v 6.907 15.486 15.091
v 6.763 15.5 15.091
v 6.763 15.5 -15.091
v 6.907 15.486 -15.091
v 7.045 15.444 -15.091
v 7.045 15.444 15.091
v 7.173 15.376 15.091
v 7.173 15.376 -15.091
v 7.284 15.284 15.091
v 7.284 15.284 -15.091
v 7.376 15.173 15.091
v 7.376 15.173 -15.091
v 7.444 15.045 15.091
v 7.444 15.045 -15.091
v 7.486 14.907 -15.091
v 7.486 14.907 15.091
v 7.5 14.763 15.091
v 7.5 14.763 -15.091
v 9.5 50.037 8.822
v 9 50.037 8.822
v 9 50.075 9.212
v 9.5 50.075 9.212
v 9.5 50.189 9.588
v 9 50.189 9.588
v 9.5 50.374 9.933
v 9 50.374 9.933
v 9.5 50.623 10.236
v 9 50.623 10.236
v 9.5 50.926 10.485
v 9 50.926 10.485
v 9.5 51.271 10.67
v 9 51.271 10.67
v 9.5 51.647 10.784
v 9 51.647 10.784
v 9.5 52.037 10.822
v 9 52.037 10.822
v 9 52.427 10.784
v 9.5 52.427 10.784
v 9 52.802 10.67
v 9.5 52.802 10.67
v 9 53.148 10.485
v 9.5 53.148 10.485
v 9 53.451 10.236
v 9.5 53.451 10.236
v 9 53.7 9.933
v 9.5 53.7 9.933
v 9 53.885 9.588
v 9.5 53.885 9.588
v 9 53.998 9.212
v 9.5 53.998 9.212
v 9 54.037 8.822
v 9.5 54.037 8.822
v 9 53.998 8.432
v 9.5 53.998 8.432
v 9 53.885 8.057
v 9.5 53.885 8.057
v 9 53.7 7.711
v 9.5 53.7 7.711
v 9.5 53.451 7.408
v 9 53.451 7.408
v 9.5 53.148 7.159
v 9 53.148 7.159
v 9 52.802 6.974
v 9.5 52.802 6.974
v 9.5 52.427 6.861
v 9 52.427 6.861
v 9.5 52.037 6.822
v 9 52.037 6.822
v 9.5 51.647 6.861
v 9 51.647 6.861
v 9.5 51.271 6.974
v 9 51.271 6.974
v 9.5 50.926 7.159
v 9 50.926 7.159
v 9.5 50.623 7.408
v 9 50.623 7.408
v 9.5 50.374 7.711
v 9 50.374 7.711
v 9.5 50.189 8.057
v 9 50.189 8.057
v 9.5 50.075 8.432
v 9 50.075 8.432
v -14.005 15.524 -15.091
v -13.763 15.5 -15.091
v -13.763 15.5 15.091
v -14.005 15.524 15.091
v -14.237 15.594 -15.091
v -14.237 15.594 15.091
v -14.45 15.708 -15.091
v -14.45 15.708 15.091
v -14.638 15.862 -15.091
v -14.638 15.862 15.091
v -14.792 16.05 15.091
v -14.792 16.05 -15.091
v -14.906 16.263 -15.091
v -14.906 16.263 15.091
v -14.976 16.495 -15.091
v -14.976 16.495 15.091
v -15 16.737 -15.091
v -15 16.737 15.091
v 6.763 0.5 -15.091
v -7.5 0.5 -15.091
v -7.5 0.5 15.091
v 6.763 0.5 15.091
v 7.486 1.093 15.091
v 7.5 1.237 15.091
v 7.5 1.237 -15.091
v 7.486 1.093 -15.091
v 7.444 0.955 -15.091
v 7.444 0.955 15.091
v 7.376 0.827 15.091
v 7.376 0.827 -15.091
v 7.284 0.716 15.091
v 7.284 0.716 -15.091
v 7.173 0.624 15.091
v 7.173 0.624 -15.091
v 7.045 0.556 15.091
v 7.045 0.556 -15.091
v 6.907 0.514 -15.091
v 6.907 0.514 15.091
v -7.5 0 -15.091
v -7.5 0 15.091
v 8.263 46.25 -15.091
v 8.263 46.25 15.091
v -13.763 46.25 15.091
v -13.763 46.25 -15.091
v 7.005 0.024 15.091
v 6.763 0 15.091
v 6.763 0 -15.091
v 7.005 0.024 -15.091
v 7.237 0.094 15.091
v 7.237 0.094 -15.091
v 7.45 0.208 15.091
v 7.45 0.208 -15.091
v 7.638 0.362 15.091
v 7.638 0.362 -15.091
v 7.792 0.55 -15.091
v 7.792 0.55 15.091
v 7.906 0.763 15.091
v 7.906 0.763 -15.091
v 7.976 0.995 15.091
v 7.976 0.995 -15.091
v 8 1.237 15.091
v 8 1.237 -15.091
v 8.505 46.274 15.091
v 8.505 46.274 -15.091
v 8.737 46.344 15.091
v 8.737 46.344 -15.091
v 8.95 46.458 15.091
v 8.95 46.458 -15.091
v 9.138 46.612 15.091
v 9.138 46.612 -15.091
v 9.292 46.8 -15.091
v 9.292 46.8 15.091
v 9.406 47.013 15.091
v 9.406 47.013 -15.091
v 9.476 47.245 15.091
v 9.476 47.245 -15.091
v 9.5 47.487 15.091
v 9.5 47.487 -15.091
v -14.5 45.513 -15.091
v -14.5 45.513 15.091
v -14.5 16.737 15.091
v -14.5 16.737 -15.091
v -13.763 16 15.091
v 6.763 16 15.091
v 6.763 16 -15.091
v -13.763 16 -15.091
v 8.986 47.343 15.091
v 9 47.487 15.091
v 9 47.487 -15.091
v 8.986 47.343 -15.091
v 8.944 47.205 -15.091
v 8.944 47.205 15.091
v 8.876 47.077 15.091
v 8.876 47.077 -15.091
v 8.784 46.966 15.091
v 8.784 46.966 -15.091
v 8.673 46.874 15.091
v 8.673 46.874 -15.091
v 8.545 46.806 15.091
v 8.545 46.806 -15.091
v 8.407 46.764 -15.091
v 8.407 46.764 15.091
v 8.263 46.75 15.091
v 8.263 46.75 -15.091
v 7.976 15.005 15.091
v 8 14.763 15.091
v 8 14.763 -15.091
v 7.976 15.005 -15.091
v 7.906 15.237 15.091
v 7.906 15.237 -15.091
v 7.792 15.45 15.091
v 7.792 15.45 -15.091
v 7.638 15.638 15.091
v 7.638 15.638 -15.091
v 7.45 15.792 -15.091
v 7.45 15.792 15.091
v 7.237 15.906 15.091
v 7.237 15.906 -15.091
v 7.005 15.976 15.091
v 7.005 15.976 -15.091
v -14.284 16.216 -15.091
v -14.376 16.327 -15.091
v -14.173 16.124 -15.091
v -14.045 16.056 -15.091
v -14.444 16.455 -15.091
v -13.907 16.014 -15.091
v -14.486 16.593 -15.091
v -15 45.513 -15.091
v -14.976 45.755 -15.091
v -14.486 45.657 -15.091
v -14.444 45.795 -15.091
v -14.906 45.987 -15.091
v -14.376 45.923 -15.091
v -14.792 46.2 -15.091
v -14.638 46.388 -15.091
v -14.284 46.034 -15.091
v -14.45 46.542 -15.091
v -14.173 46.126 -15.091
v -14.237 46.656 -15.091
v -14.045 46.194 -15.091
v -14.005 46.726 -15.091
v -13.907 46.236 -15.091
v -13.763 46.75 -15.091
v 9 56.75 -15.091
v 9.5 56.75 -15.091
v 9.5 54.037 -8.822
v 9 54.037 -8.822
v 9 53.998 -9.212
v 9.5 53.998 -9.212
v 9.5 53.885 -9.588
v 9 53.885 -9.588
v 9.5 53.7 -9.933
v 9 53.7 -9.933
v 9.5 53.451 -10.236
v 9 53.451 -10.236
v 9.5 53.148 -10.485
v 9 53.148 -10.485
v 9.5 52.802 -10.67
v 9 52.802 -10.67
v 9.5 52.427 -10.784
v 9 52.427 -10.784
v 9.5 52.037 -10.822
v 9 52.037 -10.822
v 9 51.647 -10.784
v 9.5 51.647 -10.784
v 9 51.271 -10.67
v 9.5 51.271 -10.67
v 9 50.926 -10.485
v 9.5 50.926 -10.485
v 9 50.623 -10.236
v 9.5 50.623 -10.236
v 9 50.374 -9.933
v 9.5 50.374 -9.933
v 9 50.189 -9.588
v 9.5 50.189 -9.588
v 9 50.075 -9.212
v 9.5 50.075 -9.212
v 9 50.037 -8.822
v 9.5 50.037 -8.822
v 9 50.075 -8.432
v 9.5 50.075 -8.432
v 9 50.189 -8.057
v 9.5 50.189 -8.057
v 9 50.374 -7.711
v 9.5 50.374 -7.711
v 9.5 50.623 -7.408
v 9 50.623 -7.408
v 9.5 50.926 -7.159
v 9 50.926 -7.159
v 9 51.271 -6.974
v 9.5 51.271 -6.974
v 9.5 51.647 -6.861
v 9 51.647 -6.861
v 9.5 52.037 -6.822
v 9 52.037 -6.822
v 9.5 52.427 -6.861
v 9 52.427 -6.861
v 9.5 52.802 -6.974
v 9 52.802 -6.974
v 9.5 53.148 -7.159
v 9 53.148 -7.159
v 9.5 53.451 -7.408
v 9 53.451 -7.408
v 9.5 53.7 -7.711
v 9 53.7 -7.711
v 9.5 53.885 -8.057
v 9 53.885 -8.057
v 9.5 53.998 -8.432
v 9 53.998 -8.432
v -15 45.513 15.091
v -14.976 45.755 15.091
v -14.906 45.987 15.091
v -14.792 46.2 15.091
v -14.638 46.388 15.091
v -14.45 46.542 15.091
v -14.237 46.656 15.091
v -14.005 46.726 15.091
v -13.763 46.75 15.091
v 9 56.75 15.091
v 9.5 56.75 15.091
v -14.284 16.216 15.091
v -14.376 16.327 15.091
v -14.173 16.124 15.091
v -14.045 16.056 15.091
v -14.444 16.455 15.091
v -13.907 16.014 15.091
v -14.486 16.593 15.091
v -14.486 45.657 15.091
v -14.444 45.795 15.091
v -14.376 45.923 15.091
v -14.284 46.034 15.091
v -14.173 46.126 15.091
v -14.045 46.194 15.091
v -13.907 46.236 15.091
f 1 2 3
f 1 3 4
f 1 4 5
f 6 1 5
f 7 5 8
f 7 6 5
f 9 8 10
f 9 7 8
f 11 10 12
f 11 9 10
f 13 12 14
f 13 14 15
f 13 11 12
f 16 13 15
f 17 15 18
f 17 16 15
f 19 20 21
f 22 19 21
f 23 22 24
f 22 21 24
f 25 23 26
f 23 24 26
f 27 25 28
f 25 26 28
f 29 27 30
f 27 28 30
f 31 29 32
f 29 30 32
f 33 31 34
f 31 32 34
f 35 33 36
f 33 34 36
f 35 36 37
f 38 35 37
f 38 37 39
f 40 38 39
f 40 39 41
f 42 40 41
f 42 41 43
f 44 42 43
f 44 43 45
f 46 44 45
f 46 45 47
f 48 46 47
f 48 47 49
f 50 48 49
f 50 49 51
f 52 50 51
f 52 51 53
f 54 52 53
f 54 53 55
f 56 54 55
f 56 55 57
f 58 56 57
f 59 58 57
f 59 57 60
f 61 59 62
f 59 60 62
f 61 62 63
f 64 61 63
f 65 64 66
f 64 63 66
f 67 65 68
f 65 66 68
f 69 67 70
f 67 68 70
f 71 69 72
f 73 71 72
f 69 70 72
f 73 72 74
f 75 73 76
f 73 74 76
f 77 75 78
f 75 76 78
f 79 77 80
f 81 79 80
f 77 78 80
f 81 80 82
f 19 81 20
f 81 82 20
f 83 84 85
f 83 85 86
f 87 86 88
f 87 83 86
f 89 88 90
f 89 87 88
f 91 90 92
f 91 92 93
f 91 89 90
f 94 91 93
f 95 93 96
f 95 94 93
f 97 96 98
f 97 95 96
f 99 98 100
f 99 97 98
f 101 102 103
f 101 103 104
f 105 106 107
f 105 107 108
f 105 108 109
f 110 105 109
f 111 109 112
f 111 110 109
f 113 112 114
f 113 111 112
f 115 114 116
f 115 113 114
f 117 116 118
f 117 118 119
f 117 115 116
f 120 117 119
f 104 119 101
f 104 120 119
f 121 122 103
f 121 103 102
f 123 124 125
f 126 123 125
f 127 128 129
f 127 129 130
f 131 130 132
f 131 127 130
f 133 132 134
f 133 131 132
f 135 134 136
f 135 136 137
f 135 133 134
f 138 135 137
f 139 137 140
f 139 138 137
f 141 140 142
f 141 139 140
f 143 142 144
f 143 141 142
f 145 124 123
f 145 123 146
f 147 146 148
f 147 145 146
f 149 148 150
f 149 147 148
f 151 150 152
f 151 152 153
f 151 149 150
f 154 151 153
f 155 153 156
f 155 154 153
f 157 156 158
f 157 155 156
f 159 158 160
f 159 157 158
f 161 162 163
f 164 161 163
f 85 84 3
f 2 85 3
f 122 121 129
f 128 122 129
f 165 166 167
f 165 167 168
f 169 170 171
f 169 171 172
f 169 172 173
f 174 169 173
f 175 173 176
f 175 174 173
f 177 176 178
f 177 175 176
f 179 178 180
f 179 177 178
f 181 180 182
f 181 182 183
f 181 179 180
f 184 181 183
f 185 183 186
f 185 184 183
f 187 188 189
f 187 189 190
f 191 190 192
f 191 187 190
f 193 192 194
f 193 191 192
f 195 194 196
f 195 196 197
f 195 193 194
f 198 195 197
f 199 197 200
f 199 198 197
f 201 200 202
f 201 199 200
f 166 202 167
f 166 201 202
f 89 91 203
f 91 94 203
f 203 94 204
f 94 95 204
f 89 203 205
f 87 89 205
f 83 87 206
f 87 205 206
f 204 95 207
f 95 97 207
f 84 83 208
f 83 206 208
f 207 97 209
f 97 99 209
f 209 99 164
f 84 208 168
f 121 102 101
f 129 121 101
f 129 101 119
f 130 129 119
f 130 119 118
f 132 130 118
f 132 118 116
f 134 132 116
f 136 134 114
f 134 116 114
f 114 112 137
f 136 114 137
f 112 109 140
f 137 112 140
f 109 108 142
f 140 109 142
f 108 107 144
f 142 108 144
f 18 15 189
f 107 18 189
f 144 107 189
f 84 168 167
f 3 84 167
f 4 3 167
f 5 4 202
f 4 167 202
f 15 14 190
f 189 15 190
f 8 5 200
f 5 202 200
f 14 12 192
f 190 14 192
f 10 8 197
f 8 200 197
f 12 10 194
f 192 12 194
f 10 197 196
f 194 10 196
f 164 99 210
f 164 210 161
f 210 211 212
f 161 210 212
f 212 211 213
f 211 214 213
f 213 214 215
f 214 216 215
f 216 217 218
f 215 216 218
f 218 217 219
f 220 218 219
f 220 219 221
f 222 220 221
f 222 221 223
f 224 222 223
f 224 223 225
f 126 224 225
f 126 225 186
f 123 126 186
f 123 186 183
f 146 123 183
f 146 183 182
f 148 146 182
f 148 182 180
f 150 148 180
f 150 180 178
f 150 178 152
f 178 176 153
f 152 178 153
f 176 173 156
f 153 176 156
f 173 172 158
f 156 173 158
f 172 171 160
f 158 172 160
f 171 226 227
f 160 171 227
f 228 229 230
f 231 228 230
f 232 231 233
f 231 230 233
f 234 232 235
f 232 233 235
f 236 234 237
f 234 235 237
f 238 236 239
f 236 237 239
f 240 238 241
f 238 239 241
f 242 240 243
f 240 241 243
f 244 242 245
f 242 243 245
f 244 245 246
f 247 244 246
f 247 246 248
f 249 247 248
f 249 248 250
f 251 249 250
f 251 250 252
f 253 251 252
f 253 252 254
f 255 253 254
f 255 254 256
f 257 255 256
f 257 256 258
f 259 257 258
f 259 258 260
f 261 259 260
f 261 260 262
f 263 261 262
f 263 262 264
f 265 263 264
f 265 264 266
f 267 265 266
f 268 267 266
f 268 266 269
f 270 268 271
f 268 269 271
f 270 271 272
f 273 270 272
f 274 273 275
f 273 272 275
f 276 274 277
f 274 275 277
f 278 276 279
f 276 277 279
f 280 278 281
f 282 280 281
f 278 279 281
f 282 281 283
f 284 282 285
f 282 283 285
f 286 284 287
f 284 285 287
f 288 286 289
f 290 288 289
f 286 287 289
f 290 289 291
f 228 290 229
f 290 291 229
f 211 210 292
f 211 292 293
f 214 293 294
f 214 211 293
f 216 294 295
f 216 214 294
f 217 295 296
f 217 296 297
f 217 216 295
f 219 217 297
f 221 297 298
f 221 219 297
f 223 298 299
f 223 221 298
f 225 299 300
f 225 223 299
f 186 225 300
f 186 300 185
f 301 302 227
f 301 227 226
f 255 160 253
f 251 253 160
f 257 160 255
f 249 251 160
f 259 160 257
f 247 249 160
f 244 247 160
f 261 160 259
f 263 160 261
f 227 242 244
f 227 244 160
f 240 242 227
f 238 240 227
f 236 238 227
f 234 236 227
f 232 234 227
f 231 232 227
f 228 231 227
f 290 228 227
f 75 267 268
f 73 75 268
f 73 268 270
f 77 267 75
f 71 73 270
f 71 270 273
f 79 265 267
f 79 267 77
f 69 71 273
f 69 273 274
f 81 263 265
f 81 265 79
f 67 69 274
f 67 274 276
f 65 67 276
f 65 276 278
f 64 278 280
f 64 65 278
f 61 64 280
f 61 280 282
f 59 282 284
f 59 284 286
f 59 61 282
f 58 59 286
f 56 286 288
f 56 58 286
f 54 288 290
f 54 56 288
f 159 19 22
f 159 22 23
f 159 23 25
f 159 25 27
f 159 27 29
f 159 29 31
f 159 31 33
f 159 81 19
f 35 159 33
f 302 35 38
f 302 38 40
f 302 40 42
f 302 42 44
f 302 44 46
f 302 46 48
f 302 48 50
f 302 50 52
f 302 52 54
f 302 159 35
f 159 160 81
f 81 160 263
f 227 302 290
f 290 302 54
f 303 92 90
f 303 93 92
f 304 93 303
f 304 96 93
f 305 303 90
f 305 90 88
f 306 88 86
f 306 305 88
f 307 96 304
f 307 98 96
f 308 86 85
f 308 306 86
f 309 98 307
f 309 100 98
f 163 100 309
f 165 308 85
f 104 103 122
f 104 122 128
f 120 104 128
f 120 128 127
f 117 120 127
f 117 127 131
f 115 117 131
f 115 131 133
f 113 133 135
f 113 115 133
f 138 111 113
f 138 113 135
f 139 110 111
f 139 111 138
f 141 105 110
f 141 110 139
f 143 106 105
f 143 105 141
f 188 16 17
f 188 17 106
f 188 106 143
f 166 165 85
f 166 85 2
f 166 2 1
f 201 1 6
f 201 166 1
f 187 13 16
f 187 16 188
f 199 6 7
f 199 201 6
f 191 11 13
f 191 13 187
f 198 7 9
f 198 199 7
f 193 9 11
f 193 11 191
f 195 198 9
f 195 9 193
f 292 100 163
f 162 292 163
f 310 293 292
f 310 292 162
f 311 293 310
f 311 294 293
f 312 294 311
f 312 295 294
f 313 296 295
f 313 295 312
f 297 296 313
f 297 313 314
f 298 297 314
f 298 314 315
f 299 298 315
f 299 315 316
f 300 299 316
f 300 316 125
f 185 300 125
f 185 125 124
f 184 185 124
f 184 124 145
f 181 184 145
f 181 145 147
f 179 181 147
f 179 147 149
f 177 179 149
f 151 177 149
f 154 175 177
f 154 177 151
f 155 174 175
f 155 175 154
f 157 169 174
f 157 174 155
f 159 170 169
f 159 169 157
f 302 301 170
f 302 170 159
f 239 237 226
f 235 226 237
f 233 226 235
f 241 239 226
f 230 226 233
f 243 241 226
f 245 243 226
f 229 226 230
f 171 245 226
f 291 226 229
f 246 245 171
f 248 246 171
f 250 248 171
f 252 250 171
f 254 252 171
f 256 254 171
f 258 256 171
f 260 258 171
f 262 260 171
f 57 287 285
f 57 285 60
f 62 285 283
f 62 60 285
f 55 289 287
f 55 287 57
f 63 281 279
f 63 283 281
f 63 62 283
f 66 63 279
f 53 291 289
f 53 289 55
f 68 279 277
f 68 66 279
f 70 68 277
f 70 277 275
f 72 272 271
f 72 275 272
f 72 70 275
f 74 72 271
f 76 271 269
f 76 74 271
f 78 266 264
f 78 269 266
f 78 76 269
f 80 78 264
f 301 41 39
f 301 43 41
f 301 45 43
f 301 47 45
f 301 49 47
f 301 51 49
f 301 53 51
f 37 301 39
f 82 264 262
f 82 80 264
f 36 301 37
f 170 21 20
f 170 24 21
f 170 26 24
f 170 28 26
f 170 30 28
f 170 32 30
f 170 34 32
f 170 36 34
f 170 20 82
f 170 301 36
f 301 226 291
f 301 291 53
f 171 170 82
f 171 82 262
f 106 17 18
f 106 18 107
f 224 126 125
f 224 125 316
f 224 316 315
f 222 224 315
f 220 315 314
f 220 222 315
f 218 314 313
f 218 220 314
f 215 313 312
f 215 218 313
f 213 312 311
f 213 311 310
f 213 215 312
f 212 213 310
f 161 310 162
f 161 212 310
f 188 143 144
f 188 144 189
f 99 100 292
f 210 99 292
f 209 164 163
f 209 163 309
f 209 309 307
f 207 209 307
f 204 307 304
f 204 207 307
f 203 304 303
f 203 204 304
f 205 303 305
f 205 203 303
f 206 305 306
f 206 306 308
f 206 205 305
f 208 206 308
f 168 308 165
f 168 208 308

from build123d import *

# Parameters (mm, degrees)
SKETCH1_W                    = 15
SKETCH1_H                    = 30.181487224
BASE_FLANGE2_DEPTH           = 0.5
EDGE_FLANGE1_STRIP_W         = 3.4732
EDGE_FLANGE1_STRIP_H         = 0.5
EDGE_FLANGE1_STRIP_CUT_DEPTH = 30.181487223
EDGE_FLANGE1_DEPTH           = 30.181487223
EDGE_FLANGE2_STRIP_W         = 3.4732
EDGE_FLANGE2_STRIP_H         = 0.5
EDGE_FLANGE2_STRIP_CUT_DEPTH = 30.181487223
EDGE_FLANGE2_DEPTH           = 30.181487223
EDGE_FLANGE6_STRIP_W         = 3.4732
EDGE_FLANGE6_STRIP_H         = 0.5
EDGE_FLANGE6_STRIP_CUT_DEPTH = 30.181487223
EDGE_FLANGE6_DEPTH           = 30.181487223
EDGE_FLANGE7_STRIP_W         = 3.4732
EDGE_FLANGE7_STRIP_H         = 0.5
EDGE_FLANGE7_STRIP_CUT_DEPTH = 30.181487223
EDGE_FLANGE7_DEPTH           = 30.181487223
EDGE_FLANGE8_STRIP_W         = 3.4732
EDGE_FLANGE8_STRIP_H         = 0.5
EDGE_FLANGE8_STRIP_CUT_DEPTH = 30.181487223
EDGE_FLANGE8_DEPTH           = 30.181487223
SKETCH58_R                   = 2
CUT_EXTRUDE1_DEPTH           = 64.437315854


# Sheet-metal steps are written as plain solids
with BuildPart() as part:
    # Sketch1 → Base-Flange2 (new body)
    with BuildSketch(Plane(origin=(0, 0, 0), x_dir=(1, 0, 0), z_dir=(0, 1, 0))):
        Rectangle(SKETCH1_W, SKETCH1_H)
    extrude(amount=BASE_FLANGE2_DEPTH)

    # Edge-Flange1 strip (across the edge) → Edge-Flange1 strip cut (cut)
    with BuildSketch(Plane(origin=(7.5, 0.5, 15.090743612), x_dir=(-1, 0, 0), z_dir=(0, 0, -1))):
        with Locations((-1, -0.25)):
            Rectangle(EDGE_FLANGE1_STRIP_W, EDGE_FLANGE1_STRIP_H)
    extrude(amount=EDGE_FLANGE1_STRIP_CUT_DEPTH, mode=Mode.SUBTRACT)

    # Edge-Flange1 section (across the edge) → Edge-Flange1 (add)
    with BuildSketch(Plane(origin=(7.5, 0.5, 15.090743612), x_dir=(-1, 0, 0), z_dir=(0, 0, -1))):
        with BuildLine():
            Line((-0.5, 0.7366), (-0.5, 15))
            Line((-0.5, 15), (0, 15))
            Line((0, 15), (0, 0.7366))
            ThreePointArc((0, 0.7366), (0.215745145, 0.215745145), (0.7366, 0))
            Line((0.7366, 0), (0.7366, -0.5))
            ThreePointArc((0.7366, -0.5), (-0.137808246, -0.137808246), (-0.5, 0.7366))
        make_face()
    extrude(amount=EDGE_FLANGE1_DEPTH)

    # Edge-Flange2 strip (across the edge) → Edge-Flange2 strip cut (cut)
    with BuildSketch(Plane(origin=(7.5, 15.5, 15.090743612), x_dir=(0, -1, 0), z_dir=(0, 0, -1))):
        with Locations((-1, -0.25)):
            Rectangle(EDGE_FLANGE2_STRIP_W, EDGE_FLANGE2_STRIP_H)
    extrude(amount=EDGE_FLANGE2_STRIP_CUT_DEPTH, mode=Mode.SUBTRACT)

    # Edge-Flange2 section (across the edge) → Edge-Flange2 (add)
    with BuildSketch(Plane(origin=(7.5, 15.5, 15.090743612), x_dir=(0, -1, 0), z_dir=(0, 0, -1))):
        with BuildLine():
            Line((-0.5, 0.7366), (-0.5, 22))
            Line((-0.5, 22), (0, 22))
            Line((0, 22), (0, 0.7366))
            ThreePointArc((0, 0.7366), (0.215745145, 0.215745145), (0.7366, 0))
            Line((0.7366, 0), (0.7366, -0.5))
            ThreePointArc((0.7366, -0.5), (-0.137808246, -0.137808246), (-0.5, 0.7366))
        make_face()
    extrude(amount=EDGE_FLANGE2_DEPTH)

    # Edge-Flange6 strip (across the edge) → Edge-Flange6 strip cut (cut)
    with BuildSketch(Plane(origin=(-14.5, 16, -15.090743612), x_dir=(1, 0, 0), z_dir=(0, 0, 1))):
        with Locations((-1, -0.25)):
            Rectangle(EDGE_FLANGE6_STRIP_W, EDGE_FLANGE6_STRIP_H)
    extrude(amount=EDGE_FLANGE6_STRIP_CUT_DEPTH, mode=Mode.SUBTRACT)

    # Edge-Flange6 section (across the edge) → Edge-Flange6 (add)
    with BuildSketch(Plane(origin=(-14.5, 16, -15.090743612), x_dir=(1, 0, 0), z_dir=(0, 0, 1))):
        with BuildLine():
            Line((-0.5, 0.7366), (-0.5, 30.25))
            Line((-0.5, 30.25), (0, 30.25))
            Line((0, 30.25), (0, 0.7366))
            ThreePointArc((0, 0.7366), (0.215745145, 0.215745145), (0.7366, 0))
            Line((0.7366, 0), (0.7366, -0.5))
            ThreePointArc((0.7366, -0.5), (-0.137808246, -0.137808246), (-0.5, 0.7366))
        make_face()
    extrude(amount=EDGE_FLANGE6_DEPTH)

    # Edge-Flange7 strip (across the edge) → Edge-Flange7 strip cut (cut)
    with BuildSketch(Plane(origin=(-14.5, 46.25, -15.090743612), x_dir=(0, -1, 0), z_dir=(0, 0, 1))):
        with Locations((-1, -0.25)):
            Rectangle(EDGE_FLANGE7_STRIP_W, EDGE_FLANGE7_STRIP_H)
    extrude(amount=EDGE_FLANGE7_STRIP_CUT_DEPTH, mode=Mode.SUBTRACT)

    # Edge-Flange7 section (across the edge) → Edge-Flange7 (add)
    with BuildSketch(Plane(origin=(-14.5, 46.25, -15.090743612), x_dir=(0, -1, 0), z_dir=(0, 0, 1))):
        with BuildLine():
            Line((-0.5, 0.7366), (-0.5, 23.5))
            Line((-0.5, 23.5), (0, 23.5))
            Line((0, 23.5), (0, 0.7366))
            ThreePointArc((0, 0.7366), (0.215745145, 0.215745145), (0.7366, 0))
            Line((0.7366, 0), (0.7366, -0.5))
            ThreePointArc((0.7366, -0.5), (-0.137808246, -0.137808246), (-0.5, 0.7366))
        make_face()
    extrude(amount=EDGE_FLANGE7_DEPTH)

    # Edge-Flange8 strip (across the edge) → Edge-Flange8 strip cut (cut)
    with BuildSketch(Plane(origin=(9, 46.75, 15.090743612), x_dir=(-1, 0, 0), z_dir=(0, 0, -1))):
        with Locations((-1, -0.25)):
            Rectangle(EDGE_FLANGE8_STRIP_W, EDGE_FLANGE8_STRIP_H)
    extrude(amount=EDGE_FLANGE8_STRIP_CUT_DEPTH, mode=Mode.SUBTRACT)

    # Edge-Flange8 section (across the edge) → Edge-Flange8 (add)
    with BuildSketch(Plane(origin=(9, 46.75, 15.090743612), x_dir=(-1, 0, 0), z_dir=(0, 0, -1))):
        with BuildLine():
            Line((-0.5, 0.7366), (-0.5, 10))
            Line((-0.5, 10), (0, 10))
            Line((0, 10), (0, 0.7366))
            ThreePointArc((0, 0.7366), (0.215745145, 0.215745145), (0.7366, 0))
            Line((0.7366, 0), (0.7366, -0.5))
            ThreePointArc((0.7366, -0.5), (-0.137808246, -0.137808246), (-0.5, 0.7366))
        make_face()
    extrude(amount=EDGE_FLANGE8_DEPTH)

    # Sketch58 → Cut-Extrude1 (cut, through all)
    with BuildSketch(Plane.ZY.offset(-9)):
        with Locations(Location((8.82216851, 52.036798661, 0), (0, 0, 270))):
            Circle(SKETCH58_R)
        with Locations(Location((-8.82216851, 52.036798661, 0), (0, 0, 90))):
            Circle(SKETCH58_R)
    extrude(amount=-CUT_EXTRUDE1_DEPTH, mode=Mode.SUBTRACT)


solid = part.part
